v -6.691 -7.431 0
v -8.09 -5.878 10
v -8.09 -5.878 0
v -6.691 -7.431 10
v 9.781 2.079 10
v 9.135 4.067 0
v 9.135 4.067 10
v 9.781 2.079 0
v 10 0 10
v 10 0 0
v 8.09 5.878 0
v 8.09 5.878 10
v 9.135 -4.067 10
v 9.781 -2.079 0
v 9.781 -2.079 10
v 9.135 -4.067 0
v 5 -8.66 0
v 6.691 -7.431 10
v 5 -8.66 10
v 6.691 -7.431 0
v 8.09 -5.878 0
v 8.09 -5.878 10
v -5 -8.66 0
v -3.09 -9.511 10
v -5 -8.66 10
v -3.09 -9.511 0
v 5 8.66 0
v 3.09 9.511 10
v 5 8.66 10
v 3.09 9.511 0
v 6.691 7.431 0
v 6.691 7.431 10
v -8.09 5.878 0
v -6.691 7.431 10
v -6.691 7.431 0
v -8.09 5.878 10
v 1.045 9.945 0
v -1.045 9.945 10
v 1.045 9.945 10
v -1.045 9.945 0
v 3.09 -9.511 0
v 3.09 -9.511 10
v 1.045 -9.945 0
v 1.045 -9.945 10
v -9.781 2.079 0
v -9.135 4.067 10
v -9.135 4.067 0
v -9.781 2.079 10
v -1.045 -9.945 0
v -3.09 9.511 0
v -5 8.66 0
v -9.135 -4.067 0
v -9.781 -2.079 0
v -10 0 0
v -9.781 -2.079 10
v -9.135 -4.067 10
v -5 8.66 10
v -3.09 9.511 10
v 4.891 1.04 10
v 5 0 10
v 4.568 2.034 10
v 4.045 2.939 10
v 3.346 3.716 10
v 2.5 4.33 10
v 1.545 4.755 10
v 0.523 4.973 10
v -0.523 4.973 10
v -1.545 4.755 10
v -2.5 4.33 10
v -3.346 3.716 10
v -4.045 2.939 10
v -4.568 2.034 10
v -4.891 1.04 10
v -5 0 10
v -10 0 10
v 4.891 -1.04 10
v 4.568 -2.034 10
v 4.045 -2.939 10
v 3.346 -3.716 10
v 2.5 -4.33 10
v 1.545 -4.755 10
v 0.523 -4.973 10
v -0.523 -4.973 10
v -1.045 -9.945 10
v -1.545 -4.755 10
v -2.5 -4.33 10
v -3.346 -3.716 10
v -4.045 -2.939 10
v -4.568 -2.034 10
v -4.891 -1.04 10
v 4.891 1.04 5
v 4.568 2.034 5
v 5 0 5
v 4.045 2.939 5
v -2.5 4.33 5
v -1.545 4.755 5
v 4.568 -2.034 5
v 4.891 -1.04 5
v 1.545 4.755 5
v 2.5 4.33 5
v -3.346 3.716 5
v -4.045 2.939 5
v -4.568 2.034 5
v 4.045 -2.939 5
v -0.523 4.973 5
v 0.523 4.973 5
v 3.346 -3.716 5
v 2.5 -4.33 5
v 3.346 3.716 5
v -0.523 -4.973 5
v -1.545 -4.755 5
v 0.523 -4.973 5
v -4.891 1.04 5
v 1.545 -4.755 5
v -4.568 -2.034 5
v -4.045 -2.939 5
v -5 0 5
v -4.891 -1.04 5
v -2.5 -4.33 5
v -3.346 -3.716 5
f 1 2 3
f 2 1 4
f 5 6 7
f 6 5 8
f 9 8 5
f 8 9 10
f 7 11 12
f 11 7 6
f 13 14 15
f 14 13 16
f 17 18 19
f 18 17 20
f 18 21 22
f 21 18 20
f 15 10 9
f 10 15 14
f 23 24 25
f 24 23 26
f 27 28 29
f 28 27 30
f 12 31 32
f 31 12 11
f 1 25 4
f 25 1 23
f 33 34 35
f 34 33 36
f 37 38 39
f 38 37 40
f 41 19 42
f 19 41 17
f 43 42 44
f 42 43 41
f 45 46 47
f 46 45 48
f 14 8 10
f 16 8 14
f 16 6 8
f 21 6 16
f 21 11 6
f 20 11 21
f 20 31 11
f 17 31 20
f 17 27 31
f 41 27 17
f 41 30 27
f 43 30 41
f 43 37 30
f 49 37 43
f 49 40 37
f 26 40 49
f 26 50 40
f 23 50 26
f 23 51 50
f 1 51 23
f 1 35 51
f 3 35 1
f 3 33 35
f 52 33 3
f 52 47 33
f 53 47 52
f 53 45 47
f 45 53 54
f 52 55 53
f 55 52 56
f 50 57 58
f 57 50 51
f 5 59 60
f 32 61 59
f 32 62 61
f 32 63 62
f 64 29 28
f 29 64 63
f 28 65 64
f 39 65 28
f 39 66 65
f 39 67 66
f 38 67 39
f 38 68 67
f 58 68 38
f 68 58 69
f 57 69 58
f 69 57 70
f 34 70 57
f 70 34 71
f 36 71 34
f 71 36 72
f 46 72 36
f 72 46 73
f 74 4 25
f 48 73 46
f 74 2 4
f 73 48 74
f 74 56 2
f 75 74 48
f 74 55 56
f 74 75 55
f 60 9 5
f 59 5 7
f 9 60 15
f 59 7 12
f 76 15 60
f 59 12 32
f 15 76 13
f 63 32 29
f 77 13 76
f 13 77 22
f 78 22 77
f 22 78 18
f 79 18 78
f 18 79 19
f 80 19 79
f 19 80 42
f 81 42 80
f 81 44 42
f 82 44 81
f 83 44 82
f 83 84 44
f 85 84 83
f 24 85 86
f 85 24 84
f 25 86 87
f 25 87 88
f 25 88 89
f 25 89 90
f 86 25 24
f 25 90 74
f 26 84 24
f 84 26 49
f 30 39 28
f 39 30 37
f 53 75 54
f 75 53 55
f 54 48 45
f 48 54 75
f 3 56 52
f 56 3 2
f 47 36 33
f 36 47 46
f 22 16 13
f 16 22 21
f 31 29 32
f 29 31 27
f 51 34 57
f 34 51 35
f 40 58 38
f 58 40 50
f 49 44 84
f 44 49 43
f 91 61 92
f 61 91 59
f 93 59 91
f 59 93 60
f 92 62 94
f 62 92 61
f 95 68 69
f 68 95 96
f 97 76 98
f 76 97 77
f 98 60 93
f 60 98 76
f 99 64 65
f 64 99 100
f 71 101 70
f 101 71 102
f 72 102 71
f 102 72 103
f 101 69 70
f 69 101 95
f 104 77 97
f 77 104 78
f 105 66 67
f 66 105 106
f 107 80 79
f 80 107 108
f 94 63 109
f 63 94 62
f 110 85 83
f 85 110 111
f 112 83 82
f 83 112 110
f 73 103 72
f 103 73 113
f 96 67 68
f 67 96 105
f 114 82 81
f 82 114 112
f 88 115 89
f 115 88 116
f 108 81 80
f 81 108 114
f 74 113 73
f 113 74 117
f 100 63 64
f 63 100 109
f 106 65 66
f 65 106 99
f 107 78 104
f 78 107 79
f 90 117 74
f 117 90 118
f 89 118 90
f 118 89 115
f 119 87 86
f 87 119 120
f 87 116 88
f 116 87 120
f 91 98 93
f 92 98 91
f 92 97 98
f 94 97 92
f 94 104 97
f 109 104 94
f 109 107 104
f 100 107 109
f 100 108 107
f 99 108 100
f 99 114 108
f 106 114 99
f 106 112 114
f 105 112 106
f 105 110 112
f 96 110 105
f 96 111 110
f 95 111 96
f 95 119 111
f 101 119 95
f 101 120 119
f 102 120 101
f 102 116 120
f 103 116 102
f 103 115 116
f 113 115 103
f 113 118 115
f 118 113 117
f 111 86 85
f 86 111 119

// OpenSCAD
// file: common.scad
// rcube(size, r, center)
// rcube([width,depth,height], r, center)

module rcube(dims_or_size, r, center = false) {
    dims = (dims_or_size[0] == undef) ? [dims_or_size, dims_or_size, dims_or_size] : dims_or_size;
    echo(dims);
    translate([-dims.x/2, -dims.y/2, -dims.z/2]) 
    union() {
        // cubes in x,y,z directions for the middle
        translate([r,r,0]) cube([dims.x - 2*r, dims.y - 2*r, dims.z]); 
        translate([r,0,r]) cube([dims.x - 2*r, dims.y, dims.z - 2*r]);
        translate([0,r,r]) cube([dims.x, dims.y - 2*r, dims.z - 2*r]);
        
        // cylinders for the vertices
        translate([r,r,r]) cylinder(dims.x - 2*r, r = r);
        translate([dims.x-r,r,r]) cylinder(dims.x - 2*r, r = r);
        translate([r,dims.y-r,r]) cylinder(dims.x - 2*r, r = r);
        translate([dims.x-r,dims.y-r,r]) cylinder(dims.x - 2*r, r = r);
        
        translate([r,r,r]) rotate([-90,0,0]) cylinder(dims.x - 2*r, r = r);
        translate([dims.x-r,r,r]) rotate([-90,0,0]) cylinder(dims.x - 2*r, r = r);
        translate([r,r,dims.z-r]) rotate([-90,0,0]) cylinder(dims.x - 2*r, r = r);
        translate([dims.x-r,r,dims.z-r]) rotate([-90,0,0]) cylinder(dims.x - 2*r, r = r);
        
        translate([r,r,r]) rotate([0,90,0]) cylinder(dims.x - 2*r, r = r);
        translate([r,r,dims.z-r]) rotate([0,90,0]) cylinder(dims.x - 2*r, r = r);
        translate([r,dims.y-r,r]) rotate([0,90,0]) cylinder(dims.x - 2*r, r = r);
        translate([r,dims.y-r,dims.z-r]) rotate([0,90,0]) cylinder(dims.x - 2*r, r = r);

        // spheres for the corners
        for (x = [r, dims.x - r]) {
            for (y = [r, dims.y - r]) {
                for (z = [r, dims.z - r]) {
                    translate([x,y,z]) sphere(r);
                }
            }
        }
    }
}

// h  - height
// id - inner diameter
// od - outer diameter
// d  - depth of hole

module post(h, od, id, d = undef) {
    depth = (d == undef) ? h : d;
    difference() {
        cylinder(h, r=od/2);
        translate([0,0,h - depth]) cylinder(h, r=id/2);
    }
}
// main file
// clock
include <../lib/common.scad>

$fn = 30;
post(10, 20, 10, 5);
